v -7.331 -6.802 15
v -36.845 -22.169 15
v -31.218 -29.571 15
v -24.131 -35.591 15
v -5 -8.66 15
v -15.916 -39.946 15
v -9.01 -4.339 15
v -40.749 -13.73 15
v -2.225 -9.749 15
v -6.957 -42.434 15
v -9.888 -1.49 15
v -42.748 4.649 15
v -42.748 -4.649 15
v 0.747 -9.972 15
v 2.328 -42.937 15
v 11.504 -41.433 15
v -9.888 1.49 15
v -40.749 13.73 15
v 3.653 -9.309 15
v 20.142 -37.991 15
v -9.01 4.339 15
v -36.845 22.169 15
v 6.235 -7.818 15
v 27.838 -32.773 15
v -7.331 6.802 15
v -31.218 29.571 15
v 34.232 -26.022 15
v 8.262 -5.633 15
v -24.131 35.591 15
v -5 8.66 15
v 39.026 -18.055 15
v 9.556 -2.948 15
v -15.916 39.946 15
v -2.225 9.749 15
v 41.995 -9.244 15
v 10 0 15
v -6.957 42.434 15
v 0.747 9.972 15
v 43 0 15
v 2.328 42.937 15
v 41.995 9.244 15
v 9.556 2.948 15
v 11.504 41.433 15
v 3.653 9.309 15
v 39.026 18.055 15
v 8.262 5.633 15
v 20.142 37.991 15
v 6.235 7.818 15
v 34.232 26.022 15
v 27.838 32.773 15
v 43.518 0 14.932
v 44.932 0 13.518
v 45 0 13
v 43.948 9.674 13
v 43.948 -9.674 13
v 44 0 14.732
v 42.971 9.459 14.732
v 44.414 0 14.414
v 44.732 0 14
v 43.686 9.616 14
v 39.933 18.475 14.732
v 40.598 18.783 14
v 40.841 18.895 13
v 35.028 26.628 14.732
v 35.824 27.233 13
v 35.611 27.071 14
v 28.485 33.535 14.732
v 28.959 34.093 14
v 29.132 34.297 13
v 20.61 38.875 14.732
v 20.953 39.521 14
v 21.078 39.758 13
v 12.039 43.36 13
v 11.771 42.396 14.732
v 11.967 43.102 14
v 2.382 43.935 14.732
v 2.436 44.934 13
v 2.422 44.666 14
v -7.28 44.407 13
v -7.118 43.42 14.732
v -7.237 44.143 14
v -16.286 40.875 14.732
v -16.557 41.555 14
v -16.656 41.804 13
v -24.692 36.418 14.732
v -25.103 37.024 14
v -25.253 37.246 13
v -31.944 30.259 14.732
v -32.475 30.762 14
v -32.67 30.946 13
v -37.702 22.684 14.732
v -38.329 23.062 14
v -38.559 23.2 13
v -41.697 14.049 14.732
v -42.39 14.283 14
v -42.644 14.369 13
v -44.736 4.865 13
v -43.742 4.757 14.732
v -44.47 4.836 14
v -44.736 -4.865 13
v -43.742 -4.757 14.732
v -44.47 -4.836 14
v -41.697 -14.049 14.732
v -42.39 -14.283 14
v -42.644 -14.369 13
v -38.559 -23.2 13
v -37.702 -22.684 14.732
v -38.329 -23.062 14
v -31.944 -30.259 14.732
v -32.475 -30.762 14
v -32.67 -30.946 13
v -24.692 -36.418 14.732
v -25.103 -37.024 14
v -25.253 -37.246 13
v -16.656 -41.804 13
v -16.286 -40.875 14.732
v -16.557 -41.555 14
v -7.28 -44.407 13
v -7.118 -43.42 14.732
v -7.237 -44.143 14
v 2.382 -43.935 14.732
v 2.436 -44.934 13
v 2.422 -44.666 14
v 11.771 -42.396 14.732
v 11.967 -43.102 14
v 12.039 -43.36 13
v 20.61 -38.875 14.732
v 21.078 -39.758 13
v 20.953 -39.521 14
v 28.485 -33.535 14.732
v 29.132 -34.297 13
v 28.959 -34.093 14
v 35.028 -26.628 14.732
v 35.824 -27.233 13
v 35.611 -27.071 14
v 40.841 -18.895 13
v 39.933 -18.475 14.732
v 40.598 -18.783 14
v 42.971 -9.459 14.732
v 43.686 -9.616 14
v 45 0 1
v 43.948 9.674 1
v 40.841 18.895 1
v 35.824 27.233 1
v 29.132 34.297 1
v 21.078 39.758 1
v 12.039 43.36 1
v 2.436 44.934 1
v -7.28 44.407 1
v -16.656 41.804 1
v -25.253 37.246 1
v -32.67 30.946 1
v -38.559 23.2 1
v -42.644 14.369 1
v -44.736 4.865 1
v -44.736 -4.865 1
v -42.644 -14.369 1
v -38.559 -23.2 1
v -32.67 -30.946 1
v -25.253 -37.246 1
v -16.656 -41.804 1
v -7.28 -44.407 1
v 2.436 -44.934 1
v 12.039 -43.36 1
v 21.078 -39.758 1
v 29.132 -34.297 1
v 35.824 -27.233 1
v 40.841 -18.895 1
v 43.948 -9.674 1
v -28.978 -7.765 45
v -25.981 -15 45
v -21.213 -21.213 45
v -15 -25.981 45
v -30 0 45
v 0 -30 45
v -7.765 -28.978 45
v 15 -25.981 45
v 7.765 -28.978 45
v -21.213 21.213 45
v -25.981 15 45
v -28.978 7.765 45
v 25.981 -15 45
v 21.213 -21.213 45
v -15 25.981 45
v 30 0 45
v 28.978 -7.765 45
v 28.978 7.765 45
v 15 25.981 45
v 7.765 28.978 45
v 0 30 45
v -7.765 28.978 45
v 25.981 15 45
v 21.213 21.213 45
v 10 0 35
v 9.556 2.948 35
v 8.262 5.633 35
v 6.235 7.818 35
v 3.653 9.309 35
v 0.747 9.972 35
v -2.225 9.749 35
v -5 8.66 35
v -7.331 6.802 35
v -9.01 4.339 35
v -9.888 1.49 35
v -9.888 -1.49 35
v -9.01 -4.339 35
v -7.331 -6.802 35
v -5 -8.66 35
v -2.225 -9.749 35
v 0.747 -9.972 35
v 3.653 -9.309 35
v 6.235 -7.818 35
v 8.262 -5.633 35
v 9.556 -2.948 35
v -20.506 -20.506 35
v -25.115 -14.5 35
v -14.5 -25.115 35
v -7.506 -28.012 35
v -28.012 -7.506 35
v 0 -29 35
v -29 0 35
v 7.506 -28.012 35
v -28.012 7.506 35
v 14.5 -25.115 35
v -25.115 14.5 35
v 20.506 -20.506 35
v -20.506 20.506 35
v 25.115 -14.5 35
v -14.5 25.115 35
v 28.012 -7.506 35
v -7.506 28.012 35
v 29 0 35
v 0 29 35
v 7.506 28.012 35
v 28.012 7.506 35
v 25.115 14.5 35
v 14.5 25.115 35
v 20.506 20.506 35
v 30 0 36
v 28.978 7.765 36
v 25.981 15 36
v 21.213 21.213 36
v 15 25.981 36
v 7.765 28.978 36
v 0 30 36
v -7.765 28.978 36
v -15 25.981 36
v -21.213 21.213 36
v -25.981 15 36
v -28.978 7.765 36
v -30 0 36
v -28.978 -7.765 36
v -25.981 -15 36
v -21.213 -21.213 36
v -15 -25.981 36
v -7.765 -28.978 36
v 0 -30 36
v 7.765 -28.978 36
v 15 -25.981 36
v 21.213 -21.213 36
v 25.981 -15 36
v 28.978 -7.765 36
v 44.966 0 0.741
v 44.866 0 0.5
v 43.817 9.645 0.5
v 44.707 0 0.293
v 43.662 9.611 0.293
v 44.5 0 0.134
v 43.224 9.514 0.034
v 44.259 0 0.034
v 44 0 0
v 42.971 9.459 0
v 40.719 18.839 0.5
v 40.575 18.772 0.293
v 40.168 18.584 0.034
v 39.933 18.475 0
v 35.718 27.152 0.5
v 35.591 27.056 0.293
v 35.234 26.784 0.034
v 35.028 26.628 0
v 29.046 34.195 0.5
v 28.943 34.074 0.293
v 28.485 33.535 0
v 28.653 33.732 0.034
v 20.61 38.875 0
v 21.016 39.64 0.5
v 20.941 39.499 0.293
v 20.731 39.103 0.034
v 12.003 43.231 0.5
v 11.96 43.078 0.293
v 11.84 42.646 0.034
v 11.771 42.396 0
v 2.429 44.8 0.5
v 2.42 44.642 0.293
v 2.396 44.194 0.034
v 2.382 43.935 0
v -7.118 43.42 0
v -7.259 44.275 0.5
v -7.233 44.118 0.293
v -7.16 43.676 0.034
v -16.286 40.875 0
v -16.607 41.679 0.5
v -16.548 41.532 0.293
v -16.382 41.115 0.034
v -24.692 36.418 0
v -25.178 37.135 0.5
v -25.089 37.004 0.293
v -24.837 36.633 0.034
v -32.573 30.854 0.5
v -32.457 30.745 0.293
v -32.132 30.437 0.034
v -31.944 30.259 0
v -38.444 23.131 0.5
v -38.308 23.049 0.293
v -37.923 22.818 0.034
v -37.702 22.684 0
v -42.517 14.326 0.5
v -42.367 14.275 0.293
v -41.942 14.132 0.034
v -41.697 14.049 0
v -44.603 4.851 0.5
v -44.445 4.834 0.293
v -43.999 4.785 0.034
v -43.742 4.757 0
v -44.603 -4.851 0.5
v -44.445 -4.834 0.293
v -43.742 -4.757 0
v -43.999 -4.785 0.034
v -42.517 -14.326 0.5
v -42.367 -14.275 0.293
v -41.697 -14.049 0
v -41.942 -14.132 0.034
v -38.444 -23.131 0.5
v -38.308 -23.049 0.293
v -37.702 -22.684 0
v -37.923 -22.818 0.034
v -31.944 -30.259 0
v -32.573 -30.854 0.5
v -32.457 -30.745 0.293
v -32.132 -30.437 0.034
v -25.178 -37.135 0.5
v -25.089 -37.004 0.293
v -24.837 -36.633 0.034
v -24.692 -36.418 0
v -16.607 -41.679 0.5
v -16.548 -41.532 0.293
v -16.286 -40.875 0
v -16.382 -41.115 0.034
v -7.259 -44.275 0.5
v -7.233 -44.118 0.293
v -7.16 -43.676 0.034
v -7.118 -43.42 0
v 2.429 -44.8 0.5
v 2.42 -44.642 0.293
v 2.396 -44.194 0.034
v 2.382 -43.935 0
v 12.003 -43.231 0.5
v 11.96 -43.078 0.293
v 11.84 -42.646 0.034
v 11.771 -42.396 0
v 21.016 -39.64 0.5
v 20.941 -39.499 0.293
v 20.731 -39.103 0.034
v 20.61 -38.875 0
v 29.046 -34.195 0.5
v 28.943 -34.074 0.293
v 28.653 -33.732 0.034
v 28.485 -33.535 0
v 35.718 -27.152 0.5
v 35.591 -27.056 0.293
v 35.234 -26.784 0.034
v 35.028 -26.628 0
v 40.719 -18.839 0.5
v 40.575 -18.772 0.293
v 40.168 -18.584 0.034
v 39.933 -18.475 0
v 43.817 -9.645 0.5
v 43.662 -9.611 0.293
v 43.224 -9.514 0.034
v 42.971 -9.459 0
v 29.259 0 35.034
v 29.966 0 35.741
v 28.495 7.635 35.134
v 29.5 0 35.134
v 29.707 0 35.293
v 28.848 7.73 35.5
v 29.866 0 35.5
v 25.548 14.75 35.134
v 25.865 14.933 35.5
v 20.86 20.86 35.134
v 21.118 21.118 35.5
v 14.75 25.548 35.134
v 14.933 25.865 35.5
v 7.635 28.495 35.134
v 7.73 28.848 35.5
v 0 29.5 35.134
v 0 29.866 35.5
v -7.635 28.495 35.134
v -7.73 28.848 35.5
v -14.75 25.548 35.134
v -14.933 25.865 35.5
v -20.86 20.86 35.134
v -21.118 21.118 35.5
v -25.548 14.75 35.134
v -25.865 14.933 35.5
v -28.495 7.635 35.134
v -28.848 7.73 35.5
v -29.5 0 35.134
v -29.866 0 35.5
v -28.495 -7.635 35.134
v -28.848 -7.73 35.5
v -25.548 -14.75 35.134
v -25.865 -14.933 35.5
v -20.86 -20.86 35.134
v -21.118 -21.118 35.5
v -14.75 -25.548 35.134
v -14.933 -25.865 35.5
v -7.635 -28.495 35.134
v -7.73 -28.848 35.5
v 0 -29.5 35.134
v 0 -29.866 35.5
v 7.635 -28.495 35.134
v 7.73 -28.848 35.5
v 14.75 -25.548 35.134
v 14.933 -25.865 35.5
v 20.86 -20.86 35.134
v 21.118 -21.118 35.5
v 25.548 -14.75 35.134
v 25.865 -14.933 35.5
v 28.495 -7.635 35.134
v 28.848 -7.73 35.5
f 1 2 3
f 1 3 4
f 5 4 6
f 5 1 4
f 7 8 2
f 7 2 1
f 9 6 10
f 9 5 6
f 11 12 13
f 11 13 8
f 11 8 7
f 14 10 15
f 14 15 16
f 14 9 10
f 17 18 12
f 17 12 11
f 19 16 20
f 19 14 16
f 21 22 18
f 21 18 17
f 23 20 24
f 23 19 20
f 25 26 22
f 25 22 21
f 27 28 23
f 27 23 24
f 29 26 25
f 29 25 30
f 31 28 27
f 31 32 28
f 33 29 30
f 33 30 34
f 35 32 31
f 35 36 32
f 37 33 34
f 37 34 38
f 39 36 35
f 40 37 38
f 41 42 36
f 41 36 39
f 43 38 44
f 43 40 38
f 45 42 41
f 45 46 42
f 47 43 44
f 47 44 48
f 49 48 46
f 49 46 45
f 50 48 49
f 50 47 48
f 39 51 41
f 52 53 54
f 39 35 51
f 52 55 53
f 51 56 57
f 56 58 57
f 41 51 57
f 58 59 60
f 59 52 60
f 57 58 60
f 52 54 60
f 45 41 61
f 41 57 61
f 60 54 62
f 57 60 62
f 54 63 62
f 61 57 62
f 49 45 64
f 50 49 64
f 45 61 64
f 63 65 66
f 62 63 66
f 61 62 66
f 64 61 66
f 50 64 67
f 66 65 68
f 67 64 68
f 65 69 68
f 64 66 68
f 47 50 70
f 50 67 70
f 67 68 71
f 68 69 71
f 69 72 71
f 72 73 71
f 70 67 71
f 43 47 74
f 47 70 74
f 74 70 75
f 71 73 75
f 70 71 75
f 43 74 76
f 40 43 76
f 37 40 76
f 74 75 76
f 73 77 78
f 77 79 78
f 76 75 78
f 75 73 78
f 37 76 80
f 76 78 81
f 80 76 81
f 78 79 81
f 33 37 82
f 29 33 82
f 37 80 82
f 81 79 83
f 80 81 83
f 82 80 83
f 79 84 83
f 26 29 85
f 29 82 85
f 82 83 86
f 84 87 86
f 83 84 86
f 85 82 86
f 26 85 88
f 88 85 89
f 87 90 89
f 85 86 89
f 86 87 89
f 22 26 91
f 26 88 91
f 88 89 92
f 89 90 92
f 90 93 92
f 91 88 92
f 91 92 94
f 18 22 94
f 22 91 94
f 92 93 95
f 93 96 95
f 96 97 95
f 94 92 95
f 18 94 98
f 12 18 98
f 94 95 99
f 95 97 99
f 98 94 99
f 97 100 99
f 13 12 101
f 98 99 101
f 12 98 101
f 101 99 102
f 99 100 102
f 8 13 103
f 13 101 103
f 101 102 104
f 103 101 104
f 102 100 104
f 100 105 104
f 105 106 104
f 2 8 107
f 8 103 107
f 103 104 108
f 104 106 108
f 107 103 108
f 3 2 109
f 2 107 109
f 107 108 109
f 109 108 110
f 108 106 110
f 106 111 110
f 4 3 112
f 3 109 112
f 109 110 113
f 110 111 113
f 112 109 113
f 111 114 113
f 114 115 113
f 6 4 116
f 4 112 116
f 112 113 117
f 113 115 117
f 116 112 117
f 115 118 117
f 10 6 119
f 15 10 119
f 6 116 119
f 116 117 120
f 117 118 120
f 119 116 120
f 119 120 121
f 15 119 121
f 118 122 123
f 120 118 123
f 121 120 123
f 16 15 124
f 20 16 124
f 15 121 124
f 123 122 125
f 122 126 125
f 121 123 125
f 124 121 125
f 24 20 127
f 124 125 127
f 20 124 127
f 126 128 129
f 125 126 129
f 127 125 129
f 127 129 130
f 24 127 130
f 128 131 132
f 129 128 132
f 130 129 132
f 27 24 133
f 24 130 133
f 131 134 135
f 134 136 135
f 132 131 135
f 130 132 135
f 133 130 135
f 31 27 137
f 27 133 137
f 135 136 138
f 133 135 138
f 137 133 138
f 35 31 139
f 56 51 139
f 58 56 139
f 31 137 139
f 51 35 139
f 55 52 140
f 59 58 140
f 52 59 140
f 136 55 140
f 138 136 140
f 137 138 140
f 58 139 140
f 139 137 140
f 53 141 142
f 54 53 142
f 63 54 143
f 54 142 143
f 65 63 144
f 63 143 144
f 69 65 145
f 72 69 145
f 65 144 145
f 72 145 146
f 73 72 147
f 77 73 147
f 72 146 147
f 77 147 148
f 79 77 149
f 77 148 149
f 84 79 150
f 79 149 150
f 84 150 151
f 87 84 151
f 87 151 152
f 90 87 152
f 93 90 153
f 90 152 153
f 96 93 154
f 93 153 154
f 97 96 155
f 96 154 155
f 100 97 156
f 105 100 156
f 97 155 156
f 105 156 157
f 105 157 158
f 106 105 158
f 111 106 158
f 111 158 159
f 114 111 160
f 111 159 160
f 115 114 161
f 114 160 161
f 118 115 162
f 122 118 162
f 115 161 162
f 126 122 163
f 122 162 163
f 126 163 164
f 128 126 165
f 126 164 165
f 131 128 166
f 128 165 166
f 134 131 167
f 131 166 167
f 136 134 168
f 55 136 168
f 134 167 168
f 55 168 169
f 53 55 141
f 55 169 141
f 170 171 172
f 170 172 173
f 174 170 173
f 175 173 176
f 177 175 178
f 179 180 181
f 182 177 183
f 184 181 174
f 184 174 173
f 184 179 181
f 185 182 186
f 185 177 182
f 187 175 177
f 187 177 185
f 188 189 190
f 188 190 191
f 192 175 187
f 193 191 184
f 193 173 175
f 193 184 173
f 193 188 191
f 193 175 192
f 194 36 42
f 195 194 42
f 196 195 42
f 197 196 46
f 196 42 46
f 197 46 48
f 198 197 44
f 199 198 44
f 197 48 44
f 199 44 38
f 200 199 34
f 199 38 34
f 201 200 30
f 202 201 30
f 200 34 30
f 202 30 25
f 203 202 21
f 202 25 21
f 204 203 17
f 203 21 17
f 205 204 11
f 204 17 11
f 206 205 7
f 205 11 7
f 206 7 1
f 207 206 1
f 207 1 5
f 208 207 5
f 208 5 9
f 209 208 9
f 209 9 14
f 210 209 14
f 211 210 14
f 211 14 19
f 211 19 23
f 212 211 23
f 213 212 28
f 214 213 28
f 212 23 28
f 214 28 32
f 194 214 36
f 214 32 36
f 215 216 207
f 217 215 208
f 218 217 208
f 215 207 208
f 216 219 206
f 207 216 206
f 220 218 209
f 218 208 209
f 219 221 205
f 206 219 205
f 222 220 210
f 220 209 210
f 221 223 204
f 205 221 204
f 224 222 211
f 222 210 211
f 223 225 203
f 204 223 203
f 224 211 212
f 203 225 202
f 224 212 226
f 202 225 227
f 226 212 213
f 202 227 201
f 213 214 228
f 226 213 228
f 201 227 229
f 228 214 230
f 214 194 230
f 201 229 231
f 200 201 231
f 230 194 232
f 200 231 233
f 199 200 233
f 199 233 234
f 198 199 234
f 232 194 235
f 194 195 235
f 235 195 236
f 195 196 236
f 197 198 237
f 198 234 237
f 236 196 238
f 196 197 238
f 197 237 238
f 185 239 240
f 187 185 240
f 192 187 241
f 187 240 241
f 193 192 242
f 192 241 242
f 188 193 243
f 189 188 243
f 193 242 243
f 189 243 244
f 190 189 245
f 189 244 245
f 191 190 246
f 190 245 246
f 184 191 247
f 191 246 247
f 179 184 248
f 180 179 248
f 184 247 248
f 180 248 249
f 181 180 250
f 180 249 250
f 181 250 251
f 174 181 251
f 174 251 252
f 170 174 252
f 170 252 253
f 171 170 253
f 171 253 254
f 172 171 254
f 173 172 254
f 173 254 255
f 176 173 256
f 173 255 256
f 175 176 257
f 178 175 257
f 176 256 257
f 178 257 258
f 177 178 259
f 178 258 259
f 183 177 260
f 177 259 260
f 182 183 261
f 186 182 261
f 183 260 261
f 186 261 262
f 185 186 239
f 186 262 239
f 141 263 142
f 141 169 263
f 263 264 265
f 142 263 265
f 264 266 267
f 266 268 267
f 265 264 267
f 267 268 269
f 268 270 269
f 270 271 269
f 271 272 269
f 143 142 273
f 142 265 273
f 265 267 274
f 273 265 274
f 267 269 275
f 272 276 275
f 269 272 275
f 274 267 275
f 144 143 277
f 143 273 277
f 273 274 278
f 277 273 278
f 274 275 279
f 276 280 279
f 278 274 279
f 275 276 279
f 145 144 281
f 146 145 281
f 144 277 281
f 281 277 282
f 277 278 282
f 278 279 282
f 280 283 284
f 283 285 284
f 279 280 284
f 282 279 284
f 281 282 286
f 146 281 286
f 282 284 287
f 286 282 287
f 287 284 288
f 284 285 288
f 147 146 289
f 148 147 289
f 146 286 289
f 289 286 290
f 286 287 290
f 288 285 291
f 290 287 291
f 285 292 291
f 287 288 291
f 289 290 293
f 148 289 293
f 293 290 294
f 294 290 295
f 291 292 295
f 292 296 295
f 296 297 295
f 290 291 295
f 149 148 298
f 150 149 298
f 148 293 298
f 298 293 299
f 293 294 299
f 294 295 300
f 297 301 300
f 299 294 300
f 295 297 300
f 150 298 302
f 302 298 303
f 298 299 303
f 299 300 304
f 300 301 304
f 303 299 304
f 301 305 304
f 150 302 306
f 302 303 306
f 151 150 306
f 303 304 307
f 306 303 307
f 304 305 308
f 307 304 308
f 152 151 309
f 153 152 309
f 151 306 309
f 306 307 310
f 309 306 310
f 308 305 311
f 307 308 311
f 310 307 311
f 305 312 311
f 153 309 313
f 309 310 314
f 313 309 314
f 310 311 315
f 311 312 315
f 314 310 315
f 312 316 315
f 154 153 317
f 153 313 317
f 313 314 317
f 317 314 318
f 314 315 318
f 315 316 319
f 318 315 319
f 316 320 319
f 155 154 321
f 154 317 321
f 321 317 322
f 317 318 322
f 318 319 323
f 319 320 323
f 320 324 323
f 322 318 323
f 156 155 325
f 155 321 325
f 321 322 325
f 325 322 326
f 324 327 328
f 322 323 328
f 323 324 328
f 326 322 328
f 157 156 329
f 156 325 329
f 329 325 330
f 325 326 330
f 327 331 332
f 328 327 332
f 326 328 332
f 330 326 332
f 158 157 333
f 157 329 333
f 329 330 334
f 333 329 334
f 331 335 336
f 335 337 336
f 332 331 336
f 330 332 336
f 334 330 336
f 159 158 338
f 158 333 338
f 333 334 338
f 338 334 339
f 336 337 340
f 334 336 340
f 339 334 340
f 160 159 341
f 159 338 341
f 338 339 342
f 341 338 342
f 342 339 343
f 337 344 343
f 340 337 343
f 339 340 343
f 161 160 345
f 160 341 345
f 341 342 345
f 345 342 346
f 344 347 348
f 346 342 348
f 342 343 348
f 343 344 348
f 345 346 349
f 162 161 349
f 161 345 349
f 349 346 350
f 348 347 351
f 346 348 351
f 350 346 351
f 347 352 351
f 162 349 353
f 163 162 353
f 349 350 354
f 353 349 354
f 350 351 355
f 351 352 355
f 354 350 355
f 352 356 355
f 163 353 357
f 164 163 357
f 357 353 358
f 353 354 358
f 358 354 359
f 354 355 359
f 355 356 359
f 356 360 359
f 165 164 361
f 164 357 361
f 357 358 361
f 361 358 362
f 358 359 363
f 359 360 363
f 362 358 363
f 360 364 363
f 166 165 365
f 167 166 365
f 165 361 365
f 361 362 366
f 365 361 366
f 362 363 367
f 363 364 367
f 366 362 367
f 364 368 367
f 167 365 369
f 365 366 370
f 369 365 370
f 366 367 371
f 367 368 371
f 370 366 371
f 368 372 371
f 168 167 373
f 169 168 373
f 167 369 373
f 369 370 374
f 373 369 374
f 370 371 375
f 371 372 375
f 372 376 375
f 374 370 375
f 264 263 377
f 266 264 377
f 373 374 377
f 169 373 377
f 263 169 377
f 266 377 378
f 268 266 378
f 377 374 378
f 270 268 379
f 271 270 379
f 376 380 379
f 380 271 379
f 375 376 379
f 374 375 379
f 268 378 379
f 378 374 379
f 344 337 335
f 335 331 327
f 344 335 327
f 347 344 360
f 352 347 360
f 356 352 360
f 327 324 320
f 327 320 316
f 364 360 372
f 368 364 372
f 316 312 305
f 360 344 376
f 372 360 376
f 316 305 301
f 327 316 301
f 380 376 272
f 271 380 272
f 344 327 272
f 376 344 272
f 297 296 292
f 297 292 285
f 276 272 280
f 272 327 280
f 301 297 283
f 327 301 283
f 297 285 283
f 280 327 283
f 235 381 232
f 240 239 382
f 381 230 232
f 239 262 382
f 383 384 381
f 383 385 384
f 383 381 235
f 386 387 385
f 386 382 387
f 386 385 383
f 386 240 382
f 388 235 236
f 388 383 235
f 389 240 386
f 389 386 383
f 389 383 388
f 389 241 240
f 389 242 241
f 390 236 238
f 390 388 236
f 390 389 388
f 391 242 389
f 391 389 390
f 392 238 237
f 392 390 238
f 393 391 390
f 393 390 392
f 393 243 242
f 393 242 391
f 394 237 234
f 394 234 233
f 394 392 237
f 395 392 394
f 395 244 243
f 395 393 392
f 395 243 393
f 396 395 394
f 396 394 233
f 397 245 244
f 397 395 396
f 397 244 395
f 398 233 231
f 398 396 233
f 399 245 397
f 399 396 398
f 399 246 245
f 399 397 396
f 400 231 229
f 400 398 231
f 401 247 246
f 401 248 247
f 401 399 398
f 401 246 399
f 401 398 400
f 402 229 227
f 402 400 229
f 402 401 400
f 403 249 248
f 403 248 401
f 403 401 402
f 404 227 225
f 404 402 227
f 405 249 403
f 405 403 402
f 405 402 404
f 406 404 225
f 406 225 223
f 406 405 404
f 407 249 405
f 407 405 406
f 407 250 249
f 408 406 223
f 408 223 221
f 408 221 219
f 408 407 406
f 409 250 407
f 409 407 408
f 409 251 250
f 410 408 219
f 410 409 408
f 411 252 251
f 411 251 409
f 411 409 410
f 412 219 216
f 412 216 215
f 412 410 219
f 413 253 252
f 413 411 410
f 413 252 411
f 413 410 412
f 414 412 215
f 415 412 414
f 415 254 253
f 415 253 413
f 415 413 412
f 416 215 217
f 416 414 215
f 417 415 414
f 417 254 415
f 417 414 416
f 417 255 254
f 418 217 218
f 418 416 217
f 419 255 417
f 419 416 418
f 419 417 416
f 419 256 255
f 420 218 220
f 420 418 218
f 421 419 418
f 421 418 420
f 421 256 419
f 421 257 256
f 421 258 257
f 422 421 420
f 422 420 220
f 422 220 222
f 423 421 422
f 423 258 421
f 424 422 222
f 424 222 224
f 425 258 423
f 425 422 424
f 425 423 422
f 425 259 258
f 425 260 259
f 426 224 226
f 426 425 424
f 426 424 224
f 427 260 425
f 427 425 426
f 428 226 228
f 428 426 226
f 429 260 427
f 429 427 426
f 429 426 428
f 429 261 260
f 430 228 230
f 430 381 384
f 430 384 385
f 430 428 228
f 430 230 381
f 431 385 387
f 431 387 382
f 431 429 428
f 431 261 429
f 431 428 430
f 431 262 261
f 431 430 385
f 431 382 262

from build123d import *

# Parameters (mm, degrees)
ESQUISSE1_R        = 45
BOSS_EXTRU_1_DEPTH = 15
ESQUISSE3_R        = 10
BOSS_EXTRU_2_DEPTH = 20
ESQUISSE4_R        = 30
BOSS_EXTRU_3_DEPTH = 10
CONG_1_R           = 2
CONG_2_R           = 1
CONG_3_R           = 1


with BuildPart() as part:
    # Esquisse1 → Boss.-Extru.1 (new body)
    with BuildSketch(Plane.XY):
        Circle(ESQUISSE1_R)
    extrude(amount=BOSS_EXTRU_1_DEPTH)

    # Esquisse3 → Boss.-Extru.2 (add)
    with BuildSketch(Plane.XY.offset(15)):
        Circle(ESQUISSE3_R)
    extrude(amount=BOSS_EXTRU_2_DEPTH)

    # Esquisse4 → Boss.-Extru.3 (add)
    with BuildSketch(Plane.XY.offset(35)):
        Circle(ESQUISSE4_R)
    extrude(amount=BOSS_EXTRU_3_DEPTH)

    # Congé1
    cong_1_edges = [part.edges().sort_by_distance(p)[0] for p in [
        (-45, 0, 15),
    ]]
    fillet(cong_1_edges, radius=CONG_1_R)

    # Congé2
    cong_2_edges = [part.edges().sort_by_distance(p)[0] for p in [
        (-30, 0, 35),
    ]]
    fillet(cong_2_edges, radius=CONG_2_R)

    # Congé3
    cong_3_edges = [part.edges().sort_by_distance(p)[0] for p in [
        (-45, 0, 0),
    ]]
    fillet(cong_3_edges, radius=CONG_3_R)


solid = part.part
